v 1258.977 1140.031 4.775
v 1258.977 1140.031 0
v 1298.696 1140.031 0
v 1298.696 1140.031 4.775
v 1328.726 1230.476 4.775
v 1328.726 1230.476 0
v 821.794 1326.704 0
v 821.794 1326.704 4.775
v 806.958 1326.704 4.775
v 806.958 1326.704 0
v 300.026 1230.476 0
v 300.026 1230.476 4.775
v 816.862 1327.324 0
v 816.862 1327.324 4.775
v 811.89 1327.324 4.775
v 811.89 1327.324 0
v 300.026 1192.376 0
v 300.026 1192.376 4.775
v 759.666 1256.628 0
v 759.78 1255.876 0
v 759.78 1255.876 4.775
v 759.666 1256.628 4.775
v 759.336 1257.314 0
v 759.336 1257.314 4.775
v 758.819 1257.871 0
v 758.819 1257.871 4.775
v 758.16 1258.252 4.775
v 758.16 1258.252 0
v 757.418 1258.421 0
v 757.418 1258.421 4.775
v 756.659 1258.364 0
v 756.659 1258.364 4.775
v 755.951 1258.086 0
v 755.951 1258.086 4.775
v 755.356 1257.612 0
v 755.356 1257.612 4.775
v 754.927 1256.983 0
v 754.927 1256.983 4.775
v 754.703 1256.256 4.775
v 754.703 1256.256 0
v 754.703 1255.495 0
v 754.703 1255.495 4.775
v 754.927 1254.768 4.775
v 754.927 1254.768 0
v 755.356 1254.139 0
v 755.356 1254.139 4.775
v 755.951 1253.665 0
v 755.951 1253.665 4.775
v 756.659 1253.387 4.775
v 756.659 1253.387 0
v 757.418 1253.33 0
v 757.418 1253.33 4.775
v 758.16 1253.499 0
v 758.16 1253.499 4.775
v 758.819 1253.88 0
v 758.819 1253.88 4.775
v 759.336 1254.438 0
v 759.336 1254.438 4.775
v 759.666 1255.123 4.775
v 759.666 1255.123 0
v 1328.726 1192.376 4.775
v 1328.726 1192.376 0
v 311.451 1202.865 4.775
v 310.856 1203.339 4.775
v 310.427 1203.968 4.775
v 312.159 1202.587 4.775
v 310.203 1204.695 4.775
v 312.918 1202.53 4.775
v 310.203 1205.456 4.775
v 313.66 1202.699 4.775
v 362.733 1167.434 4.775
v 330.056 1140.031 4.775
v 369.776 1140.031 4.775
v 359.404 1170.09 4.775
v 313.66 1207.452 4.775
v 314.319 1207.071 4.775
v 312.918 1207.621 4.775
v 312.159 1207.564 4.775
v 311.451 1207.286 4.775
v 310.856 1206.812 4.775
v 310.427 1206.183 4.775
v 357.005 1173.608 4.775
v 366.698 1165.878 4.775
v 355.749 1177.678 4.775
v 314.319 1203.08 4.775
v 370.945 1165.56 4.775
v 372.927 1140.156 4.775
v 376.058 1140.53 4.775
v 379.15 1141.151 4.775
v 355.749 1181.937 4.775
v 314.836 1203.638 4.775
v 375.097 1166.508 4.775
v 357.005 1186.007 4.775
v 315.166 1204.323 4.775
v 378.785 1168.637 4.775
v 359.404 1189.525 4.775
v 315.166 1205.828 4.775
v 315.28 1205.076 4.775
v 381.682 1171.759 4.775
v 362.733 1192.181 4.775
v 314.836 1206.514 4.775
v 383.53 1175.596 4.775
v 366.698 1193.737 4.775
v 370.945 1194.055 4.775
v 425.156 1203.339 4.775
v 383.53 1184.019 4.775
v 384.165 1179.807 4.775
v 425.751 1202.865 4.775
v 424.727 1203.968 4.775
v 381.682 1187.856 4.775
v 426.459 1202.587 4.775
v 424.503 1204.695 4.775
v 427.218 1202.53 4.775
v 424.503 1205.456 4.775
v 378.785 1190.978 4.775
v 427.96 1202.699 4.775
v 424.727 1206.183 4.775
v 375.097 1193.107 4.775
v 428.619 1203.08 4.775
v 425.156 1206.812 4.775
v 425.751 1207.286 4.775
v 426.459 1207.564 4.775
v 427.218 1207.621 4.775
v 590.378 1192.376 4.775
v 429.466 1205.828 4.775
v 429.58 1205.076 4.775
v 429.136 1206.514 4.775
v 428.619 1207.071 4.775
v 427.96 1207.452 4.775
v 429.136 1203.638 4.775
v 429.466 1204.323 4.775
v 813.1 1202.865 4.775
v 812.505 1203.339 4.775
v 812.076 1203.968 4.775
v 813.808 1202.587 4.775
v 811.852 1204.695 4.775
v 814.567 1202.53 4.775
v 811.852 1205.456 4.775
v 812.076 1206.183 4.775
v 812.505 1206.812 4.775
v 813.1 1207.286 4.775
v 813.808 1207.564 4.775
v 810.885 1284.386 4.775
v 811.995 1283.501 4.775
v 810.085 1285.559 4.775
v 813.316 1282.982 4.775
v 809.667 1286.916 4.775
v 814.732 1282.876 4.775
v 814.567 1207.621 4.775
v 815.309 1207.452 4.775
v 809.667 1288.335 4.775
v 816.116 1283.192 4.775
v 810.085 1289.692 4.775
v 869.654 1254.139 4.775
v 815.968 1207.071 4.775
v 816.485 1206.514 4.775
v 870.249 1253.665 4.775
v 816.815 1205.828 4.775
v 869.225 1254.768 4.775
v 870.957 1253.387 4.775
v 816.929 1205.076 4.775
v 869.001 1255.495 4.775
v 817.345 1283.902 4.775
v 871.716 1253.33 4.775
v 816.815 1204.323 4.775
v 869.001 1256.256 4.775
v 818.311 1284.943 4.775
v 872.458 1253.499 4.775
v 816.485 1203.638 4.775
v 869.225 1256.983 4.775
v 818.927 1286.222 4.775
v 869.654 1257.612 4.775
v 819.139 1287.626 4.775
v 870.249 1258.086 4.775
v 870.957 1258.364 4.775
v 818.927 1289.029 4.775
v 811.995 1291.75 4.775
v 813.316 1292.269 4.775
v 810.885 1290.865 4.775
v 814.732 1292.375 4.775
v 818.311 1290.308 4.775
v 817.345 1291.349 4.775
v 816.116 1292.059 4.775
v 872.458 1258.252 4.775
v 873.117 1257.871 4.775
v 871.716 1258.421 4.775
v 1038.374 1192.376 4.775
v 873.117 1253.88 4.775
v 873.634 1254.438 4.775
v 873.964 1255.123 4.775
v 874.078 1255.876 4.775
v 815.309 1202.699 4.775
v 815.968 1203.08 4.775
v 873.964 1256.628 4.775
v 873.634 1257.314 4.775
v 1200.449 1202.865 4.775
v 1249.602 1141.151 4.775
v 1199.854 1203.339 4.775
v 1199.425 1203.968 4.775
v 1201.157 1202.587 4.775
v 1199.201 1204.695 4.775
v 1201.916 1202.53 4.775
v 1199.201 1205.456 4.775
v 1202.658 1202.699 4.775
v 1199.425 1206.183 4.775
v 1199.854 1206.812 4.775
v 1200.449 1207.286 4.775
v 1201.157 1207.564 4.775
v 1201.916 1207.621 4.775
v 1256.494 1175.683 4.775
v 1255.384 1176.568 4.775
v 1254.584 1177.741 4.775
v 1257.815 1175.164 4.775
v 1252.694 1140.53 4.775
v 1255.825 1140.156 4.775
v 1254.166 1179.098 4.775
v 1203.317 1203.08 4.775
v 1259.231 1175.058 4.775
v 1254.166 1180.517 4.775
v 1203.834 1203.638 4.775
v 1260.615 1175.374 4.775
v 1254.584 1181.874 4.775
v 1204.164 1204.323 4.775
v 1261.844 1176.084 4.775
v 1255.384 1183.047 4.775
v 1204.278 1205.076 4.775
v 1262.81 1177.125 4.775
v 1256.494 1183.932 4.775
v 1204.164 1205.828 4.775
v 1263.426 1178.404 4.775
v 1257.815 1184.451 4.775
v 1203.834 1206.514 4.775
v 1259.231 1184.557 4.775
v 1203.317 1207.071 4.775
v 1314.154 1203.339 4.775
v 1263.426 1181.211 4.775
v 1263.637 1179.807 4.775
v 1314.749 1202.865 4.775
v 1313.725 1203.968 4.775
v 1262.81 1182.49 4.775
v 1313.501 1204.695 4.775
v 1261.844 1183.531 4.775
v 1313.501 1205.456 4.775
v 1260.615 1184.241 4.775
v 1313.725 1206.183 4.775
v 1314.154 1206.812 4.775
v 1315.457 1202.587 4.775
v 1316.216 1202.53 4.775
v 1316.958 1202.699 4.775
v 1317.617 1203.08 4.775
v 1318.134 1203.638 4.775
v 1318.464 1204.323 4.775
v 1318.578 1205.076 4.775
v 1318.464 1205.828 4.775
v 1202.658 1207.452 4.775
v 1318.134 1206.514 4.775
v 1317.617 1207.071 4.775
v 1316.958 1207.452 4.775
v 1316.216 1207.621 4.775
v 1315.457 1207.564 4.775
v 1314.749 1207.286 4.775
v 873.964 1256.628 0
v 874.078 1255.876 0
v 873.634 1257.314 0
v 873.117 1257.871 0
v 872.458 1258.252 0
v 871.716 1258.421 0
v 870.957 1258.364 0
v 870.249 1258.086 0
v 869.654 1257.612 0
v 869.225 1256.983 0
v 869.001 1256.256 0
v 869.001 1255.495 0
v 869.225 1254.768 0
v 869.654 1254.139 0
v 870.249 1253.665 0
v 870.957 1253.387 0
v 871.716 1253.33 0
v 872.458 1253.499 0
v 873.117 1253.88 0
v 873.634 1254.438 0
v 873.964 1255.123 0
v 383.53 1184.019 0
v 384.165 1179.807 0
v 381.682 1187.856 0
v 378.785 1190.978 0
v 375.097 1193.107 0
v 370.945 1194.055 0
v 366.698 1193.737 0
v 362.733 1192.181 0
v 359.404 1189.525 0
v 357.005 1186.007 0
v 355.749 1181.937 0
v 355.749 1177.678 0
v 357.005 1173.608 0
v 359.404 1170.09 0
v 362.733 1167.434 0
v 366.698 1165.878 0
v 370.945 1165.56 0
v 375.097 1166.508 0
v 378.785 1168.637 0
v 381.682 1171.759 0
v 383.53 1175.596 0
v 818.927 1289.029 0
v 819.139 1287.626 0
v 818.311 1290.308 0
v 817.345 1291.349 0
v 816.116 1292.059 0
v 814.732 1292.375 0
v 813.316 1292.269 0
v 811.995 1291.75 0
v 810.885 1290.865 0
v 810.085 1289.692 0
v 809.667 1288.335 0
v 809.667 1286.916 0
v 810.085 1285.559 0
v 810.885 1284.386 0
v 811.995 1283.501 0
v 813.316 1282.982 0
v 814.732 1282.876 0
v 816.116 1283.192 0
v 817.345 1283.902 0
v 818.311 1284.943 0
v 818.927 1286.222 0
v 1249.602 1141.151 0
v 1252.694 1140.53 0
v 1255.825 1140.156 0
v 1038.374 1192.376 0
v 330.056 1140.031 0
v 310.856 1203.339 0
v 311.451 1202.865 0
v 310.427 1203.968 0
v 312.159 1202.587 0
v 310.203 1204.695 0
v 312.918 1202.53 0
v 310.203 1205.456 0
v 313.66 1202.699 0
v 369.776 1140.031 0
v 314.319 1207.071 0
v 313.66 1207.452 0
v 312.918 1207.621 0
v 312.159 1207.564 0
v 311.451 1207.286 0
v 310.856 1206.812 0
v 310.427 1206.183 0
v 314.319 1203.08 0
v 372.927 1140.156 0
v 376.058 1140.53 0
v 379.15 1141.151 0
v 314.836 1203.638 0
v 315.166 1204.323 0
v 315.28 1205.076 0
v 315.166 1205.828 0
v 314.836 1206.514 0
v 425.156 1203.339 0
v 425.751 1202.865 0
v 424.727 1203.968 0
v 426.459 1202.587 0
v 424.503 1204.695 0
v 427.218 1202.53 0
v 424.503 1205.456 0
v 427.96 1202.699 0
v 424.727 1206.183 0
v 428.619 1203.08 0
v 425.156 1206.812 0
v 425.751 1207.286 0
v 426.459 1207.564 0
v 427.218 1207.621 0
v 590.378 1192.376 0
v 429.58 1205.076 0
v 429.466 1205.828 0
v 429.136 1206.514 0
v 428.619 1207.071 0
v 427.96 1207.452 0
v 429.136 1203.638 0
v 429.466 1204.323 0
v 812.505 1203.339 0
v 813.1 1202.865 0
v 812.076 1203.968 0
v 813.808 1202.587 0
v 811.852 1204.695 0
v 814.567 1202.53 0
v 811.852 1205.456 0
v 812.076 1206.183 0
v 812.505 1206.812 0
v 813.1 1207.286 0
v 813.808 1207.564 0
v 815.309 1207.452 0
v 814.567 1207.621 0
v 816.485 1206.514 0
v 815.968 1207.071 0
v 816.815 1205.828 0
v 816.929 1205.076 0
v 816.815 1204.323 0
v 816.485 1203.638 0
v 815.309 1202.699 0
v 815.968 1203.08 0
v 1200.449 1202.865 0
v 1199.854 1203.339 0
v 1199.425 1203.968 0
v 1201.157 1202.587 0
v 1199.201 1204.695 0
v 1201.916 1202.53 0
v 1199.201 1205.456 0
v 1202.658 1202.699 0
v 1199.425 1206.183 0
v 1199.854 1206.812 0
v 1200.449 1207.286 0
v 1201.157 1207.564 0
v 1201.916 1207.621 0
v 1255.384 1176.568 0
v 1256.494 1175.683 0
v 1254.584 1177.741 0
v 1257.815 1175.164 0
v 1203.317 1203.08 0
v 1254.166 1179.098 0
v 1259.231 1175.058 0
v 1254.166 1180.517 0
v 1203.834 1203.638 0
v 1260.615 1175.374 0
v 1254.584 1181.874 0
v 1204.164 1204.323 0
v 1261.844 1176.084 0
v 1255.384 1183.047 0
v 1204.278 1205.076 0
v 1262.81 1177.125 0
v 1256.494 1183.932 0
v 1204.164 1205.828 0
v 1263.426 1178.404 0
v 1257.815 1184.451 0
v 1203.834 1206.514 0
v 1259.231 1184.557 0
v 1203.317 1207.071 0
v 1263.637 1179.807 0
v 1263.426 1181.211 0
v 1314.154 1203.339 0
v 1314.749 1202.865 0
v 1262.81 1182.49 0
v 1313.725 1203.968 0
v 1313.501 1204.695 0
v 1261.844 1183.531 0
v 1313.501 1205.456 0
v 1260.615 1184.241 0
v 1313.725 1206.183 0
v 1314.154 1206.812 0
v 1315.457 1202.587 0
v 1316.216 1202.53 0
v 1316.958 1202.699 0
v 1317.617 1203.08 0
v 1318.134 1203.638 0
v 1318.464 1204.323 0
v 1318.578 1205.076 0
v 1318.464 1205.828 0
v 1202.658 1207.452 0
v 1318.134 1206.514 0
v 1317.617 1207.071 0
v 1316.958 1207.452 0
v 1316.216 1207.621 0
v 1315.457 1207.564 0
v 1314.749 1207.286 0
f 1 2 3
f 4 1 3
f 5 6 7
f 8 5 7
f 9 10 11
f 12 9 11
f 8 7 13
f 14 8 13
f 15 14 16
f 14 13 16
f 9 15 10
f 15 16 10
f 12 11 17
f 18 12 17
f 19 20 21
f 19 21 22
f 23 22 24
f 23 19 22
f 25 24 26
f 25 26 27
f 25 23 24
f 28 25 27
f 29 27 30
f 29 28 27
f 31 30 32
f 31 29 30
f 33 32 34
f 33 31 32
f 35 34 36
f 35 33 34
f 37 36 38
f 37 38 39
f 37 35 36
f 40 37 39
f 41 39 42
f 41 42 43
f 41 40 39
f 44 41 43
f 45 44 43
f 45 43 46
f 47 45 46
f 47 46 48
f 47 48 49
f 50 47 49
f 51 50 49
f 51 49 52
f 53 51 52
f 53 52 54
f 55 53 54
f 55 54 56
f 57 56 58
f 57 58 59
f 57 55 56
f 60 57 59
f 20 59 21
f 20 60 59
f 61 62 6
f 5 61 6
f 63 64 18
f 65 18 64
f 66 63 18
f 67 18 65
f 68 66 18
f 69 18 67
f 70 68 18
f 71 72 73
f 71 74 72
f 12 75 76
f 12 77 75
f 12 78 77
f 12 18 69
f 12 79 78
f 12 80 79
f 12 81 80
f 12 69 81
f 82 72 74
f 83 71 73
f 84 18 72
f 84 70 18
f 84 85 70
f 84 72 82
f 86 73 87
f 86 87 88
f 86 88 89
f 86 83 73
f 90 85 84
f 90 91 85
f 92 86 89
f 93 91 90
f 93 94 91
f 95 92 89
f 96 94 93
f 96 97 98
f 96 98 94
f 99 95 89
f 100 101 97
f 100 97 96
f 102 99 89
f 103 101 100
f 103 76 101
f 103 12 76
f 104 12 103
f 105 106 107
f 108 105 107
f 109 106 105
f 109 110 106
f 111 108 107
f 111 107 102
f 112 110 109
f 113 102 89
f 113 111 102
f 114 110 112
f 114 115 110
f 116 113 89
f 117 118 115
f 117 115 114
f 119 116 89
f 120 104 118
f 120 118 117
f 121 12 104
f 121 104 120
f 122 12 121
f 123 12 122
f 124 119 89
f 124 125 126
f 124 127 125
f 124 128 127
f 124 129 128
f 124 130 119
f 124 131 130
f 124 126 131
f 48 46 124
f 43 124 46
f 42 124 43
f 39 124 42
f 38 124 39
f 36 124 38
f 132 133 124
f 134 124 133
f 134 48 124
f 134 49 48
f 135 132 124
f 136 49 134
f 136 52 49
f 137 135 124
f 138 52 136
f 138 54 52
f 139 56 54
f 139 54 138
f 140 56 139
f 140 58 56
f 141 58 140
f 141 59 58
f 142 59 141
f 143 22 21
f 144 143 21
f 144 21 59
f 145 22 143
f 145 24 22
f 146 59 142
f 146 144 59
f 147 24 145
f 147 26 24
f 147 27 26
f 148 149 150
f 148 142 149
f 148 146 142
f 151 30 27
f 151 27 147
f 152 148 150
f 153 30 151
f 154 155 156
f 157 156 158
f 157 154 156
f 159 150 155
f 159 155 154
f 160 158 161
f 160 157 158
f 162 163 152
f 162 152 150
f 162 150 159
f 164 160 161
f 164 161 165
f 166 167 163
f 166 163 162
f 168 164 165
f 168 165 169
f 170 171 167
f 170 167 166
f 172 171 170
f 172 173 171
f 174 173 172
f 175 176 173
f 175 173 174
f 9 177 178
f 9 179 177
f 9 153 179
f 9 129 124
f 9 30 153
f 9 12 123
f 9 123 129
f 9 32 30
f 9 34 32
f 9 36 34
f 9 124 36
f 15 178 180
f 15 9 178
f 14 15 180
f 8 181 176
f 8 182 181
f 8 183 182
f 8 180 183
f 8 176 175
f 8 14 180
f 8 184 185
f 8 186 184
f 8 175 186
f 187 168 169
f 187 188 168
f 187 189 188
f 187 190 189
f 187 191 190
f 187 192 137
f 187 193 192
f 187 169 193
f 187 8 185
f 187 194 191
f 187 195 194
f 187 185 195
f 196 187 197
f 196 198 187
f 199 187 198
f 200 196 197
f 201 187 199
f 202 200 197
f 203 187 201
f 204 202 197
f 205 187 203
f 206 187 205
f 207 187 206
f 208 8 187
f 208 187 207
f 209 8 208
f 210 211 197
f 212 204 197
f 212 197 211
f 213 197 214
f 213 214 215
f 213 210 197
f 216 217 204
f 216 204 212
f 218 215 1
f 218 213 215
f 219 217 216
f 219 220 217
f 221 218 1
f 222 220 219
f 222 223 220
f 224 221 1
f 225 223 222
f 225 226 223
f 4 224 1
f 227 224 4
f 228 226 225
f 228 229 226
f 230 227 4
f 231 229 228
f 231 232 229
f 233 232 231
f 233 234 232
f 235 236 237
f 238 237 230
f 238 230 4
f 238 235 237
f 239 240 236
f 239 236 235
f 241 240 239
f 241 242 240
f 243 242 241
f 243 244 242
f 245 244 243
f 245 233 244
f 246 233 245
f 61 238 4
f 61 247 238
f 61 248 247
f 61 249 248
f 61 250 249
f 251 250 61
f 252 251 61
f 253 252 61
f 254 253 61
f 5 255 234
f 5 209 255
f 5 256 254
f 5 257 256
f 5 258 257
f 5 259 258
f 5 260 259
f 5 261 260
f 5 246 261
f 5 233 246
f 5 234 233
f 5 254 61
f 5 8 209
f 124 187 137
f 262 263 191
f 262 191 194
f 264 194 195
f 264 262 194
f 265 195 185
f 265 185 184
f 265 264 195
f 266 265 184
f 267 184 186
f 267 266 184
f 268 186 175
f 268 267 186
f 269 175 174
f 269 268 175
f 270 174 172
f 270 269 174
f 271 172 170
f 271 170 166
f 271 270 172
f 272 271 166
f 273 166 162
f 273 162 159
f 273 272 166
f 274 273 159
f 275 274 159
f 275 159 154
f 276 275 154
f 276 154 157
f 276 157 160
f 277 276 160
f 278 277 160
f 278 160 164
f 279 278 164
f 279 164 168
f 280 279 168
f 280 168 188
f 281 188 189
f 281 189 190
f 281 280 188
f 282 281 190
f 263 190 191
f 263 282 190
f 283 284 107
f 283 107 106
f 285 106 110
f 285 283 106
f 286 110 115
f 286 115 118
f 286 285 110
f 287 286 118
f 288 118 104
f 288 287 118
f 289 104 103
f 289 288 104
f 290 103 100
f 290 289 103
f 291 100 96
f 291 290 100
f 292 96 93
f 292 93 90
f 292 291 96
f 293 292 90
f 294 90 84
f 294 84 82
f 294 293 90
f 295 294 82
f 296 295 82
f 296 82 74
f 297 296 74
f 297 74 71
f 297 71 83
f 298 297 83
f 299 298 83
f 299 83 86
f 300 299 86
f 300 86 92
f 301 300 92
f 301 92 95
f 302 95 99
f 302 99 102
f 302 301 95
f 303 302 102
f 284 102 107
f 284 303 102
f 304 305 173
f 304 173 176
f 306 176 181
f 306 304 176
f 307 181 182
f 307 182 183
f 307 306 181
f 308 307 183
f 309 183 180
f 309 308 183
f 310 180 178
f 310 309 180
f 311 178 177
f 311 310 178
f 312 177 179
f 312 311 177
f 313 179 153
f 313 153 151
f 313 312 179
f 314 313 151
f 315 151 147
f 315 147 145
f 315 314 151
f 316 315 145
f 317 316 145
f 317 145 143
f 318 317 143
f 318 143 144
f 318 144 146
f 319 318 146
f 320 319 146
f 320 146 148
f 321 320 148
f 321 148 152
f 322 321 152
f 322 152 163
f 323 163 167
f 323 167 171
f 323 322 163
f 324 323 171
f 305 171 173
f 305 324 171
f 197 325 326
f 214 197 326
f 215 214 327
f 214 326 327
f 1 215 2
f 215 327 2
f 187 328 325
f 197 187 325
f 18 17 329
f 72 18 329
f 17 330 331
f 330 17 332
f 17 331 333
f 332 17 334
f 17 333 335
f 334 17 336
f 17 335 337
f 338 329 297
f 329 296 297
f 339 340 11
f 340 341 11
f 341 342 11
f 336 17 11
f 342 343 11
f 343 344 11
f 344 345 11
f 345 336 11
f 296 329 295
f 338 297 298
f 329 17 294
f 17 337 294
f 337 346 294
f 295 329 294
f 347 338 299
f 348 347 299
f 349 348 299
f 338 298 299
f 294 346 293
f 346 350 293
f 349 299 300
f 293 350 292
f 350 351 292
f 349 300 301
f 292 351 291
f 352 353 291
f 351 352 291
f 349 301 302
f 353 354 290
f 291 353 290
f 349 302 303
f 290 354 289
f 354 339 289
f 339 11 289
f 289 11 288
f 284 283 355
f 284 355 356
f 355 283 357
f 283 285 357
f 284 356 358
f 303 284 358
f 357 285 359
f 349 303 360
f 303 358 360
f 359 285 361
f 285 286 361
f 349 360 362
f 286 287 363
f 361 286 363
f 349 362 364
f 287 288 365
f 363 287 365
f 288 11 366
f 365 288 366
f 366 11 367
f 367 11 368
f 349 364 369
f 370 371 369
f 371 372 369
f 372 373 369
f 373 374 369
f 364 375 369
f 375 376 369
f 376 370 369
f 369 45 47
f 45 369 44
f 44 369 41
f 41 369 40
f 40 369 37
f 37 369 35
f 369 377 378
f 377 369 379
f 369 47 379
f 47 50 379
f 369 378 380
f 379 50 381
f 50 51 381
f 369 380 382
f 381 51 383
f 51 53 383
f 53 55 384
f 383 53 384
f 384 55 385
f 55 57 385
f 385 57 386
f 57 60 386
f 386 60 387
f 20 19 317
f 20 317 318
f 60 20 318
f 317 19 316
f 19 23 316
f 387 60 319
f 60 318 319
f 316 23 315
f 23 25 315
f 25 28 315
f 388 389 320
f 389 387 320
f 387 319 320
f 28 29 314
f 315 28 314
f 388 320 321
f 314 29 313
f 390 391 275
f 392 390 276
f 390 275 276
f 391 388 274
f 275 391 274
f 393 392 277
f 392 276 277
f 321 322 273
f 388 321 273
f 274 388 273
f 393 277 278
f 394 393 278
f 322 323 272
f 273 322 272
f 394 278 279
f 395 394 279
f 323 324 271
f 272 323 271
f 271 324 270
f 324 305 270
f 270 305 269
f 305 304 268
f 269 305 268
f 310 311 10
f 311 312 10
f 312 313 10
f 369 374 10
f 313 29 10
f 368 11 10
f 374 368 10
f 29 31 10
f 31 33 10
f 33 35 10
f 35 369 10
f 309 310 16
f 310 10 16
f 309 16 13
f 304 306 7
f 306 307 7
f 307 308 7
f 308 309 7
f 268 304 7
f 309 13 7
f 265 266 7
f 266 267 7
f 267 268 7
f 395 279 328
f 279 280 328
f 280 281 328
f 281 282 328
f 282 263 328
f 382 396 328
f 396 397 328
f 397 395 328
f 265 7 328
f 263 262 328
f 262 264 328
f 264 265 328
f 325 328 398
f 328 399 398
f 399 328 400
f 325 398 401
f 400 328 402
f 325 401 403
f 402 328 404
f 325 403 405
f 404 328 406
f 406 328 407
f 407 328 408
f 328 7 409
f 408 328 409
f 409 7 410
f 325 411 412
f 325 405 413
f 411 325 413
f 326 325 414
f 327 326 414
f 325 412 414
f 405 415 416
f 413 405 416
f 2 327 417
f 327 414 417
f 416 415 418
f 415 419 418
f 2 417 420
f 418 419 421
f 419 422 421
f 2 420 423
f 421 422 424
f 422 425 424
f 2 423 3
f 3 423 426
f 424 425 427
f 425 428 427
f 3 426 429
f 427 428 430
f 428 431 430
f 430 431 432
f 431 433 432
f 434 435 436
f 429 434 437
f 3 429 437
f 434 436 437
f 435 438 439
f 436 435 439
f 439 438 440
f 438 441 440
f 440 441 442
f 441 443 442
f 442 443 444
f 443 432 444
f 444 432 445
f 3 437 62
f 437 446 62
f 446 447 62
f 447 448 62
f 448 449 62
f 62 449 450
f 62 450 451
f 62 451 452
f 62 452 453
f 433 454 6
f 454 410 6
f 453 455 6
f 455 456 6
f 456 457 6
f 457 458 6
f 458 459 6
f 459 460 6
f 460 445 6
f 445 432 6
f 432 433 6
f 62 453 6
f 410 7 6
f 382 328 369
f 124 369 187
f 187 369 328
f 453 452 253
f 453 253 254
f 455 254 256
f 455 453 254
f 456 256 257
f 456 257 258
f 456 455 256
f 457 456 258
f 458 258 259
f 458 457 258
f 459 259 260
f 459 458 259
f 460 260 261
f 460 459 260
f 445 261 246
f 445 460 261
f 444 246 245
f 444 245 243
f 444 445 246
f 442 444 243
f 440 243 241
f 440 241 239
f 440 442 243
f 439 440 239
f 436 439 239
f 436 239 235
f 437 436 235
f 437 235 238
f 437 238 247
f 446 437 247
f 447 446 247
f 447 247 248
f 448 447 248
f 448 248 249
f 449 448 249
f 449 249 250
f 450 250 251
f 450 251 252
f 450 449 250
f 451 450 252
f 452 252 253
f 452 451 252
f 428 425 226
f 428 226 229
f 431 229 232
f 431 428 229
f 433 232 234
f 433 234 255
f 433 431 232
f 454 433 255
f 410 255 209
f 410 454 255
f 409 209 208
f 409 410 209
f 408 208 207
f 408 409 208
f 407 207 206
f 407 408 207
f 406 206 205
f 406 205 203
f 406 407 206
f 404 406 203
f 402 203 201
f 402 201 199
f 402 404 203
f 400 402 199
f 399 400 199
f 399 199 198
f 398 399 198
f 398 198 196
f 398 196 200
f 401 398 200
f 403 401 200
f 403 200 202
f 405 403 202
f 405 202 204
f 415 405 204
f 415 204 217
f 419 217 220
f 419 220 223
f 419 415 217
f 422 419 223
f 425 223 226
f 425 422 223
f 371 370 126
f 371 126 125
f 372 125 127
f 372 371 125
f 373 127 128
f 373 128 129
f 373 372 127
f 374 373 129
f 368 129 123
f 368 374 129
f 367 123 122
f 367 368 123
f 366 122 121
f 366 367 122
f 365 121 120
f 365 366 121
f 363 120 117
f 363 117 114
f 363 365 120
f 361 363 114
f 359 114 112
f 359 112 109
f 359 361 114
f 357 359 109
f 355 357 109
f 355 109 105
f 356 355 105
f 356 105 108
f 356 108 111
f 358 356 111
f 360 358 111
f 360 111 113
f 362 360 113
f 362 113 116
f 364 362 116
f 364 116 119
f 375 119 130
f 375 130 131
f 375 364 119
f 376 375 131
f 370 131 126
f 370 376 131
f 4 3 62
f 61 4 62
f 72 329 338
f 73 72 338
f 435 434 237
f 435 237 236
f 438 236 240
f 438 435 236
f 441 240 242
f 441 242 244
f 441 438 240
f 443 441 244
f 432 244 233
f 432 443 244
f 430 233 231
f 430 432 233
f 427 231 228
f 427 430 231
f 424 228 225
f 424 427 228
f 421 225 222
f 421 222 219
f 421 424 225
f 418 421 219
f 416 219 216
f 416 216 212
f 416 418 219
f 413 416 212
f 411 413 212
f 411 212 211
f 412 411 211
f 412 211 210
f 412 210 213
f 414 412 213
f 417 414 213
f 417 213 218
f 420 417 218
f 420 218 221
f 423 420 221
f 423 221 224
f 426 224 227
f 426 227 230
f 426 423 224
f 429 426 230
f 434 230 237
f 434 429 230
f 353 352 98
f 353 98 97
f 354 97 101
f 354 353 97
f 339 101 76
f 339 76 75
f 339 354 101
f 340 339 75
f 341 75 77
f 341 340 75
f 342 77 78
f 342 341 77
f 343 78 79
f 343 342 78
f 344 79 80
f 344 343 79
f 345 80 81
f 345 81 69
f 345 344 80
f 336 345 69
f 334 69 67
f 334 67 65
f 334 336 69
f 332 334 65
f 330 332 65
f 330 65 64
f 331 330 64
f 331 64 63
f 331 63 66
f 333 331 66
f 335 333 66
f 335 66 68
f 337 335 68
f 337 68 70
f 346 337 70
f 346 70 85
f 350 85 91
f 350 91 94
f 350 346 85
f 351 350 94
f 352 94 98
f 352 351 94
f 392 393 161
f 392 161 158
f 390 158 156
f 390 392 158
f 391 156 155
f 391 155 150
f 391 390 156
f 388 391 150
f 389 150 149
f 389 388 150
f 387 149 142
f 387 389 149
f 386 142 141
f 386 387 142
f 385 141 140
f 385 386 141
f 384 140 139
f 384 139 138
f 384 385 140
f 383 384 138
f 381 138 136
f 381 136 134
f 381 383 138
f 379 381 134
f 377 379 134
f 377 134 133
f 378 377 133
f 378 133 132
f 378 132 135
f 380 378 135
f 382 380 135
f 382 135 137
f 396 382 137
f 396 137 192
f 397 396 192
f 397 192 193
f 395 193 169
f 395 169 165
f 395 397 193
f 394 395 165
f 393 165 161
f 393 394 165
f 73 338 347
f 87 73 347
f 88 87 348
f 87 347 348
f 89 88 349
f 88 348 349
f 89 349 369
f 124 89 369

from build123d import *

# Parameters (mm, degrees)
MODEL_R             = 14.2875
MODEL_R_2           = 4.7625
MODEL_R_3           = 2.5527
BOSS_EXTRUDE1_DEPTH = 4.7752


with BuildPart() as part:
    # Model → Boss-Extrude1 (new body)
    with BuildSketch(Plane.XY):
        with BuildLine():
            Line((379.149829152, 1141.15149464), (590.378339475, 1192.375592492))
            Line((590.378339475, 1192.375592492), (814.376062419, 1192.375592492))
            Line((814.376062419, 1192.375592492), (1038.373785363, 1192.375592492))
            Line((1038.373785363, 1192.375592492), (1249.602295686, 1141.15149464))
            ThreePointArc((1249.602295686, 1141.15149464), (1254.256081724, 1140.312171612), (1258.976587117, 1140.031072925))
            Line((1258.976587117, 1140.031072925), (1298.696307446, 1140.031072925))
            Line((1298.696307446, 1140.031072925), (1328.726062419, 1192.375592492))
            Line((1328.726062419, 1192.375592492), (1328.726062419, 1230.475592492))
            Line((1328.726062419, 1230.475592492), (821.794166075, 1326.704151001))
            ThreePointArc((821.794166075, 1326.704151001), (814.376062419, 1327.401992492), (806.957958762, 1326.704151001))
            Line((806.957958762, 1326.704151001), (300.026062419, 1230.475592492))
            Line((300.026062419, 1230.475592492), (300.026062419, 1192.375592492))
            Line((300.026062419, 1192.375592492), (330.055817392, 1140.031072925))
            Line((330.055817392, 1140.031072925), (369.775537721, 1140.031072925))
            ThreePointArc((369.775537721, 1140.031072925), (374.496043114, 1140.312171612), (379.149829152, 1141.15149464))
        make_face()
        with Locations((369.877137721, 1179.807472925)):
            Circle(MODEL_R, mode=Mode.SUBTRACT)
        with Locations((814.376062419, 1287.625592492)):
            Circle(MODEL_R_2, mode=Mode.SUBTRACT)
        with Locations((1258.874987117, 1179.807472925)):
            Circle(MODEL_R_2, mode=Mode.SUBTRACT)
        with Locations((1201.72498751, 1205.075592492)):
            Circle(MODEL_R_3, mode=Mode.SUBTRACT)
        with Locations((1316.024986723, 1205.075592492)):
            Circle(MODEL_R_3, mode=Mode.SUBTRACT)
        with Locations((757.227138115, 1255.875592492)):
            Circle(MODEL_R_3, mode=Mode.SUBTRACT)
        with Locations((871.524986723, 1255.875592492)):
            Circle(MODEL_R_3, mode=Mode.SUBTRACT)
        with Locations((814.376062419, 1205.075592492)):
            Circle(MODEL_R_3, mode=Mode.SUBTRACT)
        with Locations((312.727138115, 1205.075592492)):
            Circle(MODEL_R_3, mode=Mode.SUBTRACT)
        with Locations((427.027137328, 1205.075592492)):
            Circle(MODEL_R_3, mode=Mode.SUBTRACT)
    extrude(amount=BOSS_EXTRUDE1_DEPTH)


solid = part.part
